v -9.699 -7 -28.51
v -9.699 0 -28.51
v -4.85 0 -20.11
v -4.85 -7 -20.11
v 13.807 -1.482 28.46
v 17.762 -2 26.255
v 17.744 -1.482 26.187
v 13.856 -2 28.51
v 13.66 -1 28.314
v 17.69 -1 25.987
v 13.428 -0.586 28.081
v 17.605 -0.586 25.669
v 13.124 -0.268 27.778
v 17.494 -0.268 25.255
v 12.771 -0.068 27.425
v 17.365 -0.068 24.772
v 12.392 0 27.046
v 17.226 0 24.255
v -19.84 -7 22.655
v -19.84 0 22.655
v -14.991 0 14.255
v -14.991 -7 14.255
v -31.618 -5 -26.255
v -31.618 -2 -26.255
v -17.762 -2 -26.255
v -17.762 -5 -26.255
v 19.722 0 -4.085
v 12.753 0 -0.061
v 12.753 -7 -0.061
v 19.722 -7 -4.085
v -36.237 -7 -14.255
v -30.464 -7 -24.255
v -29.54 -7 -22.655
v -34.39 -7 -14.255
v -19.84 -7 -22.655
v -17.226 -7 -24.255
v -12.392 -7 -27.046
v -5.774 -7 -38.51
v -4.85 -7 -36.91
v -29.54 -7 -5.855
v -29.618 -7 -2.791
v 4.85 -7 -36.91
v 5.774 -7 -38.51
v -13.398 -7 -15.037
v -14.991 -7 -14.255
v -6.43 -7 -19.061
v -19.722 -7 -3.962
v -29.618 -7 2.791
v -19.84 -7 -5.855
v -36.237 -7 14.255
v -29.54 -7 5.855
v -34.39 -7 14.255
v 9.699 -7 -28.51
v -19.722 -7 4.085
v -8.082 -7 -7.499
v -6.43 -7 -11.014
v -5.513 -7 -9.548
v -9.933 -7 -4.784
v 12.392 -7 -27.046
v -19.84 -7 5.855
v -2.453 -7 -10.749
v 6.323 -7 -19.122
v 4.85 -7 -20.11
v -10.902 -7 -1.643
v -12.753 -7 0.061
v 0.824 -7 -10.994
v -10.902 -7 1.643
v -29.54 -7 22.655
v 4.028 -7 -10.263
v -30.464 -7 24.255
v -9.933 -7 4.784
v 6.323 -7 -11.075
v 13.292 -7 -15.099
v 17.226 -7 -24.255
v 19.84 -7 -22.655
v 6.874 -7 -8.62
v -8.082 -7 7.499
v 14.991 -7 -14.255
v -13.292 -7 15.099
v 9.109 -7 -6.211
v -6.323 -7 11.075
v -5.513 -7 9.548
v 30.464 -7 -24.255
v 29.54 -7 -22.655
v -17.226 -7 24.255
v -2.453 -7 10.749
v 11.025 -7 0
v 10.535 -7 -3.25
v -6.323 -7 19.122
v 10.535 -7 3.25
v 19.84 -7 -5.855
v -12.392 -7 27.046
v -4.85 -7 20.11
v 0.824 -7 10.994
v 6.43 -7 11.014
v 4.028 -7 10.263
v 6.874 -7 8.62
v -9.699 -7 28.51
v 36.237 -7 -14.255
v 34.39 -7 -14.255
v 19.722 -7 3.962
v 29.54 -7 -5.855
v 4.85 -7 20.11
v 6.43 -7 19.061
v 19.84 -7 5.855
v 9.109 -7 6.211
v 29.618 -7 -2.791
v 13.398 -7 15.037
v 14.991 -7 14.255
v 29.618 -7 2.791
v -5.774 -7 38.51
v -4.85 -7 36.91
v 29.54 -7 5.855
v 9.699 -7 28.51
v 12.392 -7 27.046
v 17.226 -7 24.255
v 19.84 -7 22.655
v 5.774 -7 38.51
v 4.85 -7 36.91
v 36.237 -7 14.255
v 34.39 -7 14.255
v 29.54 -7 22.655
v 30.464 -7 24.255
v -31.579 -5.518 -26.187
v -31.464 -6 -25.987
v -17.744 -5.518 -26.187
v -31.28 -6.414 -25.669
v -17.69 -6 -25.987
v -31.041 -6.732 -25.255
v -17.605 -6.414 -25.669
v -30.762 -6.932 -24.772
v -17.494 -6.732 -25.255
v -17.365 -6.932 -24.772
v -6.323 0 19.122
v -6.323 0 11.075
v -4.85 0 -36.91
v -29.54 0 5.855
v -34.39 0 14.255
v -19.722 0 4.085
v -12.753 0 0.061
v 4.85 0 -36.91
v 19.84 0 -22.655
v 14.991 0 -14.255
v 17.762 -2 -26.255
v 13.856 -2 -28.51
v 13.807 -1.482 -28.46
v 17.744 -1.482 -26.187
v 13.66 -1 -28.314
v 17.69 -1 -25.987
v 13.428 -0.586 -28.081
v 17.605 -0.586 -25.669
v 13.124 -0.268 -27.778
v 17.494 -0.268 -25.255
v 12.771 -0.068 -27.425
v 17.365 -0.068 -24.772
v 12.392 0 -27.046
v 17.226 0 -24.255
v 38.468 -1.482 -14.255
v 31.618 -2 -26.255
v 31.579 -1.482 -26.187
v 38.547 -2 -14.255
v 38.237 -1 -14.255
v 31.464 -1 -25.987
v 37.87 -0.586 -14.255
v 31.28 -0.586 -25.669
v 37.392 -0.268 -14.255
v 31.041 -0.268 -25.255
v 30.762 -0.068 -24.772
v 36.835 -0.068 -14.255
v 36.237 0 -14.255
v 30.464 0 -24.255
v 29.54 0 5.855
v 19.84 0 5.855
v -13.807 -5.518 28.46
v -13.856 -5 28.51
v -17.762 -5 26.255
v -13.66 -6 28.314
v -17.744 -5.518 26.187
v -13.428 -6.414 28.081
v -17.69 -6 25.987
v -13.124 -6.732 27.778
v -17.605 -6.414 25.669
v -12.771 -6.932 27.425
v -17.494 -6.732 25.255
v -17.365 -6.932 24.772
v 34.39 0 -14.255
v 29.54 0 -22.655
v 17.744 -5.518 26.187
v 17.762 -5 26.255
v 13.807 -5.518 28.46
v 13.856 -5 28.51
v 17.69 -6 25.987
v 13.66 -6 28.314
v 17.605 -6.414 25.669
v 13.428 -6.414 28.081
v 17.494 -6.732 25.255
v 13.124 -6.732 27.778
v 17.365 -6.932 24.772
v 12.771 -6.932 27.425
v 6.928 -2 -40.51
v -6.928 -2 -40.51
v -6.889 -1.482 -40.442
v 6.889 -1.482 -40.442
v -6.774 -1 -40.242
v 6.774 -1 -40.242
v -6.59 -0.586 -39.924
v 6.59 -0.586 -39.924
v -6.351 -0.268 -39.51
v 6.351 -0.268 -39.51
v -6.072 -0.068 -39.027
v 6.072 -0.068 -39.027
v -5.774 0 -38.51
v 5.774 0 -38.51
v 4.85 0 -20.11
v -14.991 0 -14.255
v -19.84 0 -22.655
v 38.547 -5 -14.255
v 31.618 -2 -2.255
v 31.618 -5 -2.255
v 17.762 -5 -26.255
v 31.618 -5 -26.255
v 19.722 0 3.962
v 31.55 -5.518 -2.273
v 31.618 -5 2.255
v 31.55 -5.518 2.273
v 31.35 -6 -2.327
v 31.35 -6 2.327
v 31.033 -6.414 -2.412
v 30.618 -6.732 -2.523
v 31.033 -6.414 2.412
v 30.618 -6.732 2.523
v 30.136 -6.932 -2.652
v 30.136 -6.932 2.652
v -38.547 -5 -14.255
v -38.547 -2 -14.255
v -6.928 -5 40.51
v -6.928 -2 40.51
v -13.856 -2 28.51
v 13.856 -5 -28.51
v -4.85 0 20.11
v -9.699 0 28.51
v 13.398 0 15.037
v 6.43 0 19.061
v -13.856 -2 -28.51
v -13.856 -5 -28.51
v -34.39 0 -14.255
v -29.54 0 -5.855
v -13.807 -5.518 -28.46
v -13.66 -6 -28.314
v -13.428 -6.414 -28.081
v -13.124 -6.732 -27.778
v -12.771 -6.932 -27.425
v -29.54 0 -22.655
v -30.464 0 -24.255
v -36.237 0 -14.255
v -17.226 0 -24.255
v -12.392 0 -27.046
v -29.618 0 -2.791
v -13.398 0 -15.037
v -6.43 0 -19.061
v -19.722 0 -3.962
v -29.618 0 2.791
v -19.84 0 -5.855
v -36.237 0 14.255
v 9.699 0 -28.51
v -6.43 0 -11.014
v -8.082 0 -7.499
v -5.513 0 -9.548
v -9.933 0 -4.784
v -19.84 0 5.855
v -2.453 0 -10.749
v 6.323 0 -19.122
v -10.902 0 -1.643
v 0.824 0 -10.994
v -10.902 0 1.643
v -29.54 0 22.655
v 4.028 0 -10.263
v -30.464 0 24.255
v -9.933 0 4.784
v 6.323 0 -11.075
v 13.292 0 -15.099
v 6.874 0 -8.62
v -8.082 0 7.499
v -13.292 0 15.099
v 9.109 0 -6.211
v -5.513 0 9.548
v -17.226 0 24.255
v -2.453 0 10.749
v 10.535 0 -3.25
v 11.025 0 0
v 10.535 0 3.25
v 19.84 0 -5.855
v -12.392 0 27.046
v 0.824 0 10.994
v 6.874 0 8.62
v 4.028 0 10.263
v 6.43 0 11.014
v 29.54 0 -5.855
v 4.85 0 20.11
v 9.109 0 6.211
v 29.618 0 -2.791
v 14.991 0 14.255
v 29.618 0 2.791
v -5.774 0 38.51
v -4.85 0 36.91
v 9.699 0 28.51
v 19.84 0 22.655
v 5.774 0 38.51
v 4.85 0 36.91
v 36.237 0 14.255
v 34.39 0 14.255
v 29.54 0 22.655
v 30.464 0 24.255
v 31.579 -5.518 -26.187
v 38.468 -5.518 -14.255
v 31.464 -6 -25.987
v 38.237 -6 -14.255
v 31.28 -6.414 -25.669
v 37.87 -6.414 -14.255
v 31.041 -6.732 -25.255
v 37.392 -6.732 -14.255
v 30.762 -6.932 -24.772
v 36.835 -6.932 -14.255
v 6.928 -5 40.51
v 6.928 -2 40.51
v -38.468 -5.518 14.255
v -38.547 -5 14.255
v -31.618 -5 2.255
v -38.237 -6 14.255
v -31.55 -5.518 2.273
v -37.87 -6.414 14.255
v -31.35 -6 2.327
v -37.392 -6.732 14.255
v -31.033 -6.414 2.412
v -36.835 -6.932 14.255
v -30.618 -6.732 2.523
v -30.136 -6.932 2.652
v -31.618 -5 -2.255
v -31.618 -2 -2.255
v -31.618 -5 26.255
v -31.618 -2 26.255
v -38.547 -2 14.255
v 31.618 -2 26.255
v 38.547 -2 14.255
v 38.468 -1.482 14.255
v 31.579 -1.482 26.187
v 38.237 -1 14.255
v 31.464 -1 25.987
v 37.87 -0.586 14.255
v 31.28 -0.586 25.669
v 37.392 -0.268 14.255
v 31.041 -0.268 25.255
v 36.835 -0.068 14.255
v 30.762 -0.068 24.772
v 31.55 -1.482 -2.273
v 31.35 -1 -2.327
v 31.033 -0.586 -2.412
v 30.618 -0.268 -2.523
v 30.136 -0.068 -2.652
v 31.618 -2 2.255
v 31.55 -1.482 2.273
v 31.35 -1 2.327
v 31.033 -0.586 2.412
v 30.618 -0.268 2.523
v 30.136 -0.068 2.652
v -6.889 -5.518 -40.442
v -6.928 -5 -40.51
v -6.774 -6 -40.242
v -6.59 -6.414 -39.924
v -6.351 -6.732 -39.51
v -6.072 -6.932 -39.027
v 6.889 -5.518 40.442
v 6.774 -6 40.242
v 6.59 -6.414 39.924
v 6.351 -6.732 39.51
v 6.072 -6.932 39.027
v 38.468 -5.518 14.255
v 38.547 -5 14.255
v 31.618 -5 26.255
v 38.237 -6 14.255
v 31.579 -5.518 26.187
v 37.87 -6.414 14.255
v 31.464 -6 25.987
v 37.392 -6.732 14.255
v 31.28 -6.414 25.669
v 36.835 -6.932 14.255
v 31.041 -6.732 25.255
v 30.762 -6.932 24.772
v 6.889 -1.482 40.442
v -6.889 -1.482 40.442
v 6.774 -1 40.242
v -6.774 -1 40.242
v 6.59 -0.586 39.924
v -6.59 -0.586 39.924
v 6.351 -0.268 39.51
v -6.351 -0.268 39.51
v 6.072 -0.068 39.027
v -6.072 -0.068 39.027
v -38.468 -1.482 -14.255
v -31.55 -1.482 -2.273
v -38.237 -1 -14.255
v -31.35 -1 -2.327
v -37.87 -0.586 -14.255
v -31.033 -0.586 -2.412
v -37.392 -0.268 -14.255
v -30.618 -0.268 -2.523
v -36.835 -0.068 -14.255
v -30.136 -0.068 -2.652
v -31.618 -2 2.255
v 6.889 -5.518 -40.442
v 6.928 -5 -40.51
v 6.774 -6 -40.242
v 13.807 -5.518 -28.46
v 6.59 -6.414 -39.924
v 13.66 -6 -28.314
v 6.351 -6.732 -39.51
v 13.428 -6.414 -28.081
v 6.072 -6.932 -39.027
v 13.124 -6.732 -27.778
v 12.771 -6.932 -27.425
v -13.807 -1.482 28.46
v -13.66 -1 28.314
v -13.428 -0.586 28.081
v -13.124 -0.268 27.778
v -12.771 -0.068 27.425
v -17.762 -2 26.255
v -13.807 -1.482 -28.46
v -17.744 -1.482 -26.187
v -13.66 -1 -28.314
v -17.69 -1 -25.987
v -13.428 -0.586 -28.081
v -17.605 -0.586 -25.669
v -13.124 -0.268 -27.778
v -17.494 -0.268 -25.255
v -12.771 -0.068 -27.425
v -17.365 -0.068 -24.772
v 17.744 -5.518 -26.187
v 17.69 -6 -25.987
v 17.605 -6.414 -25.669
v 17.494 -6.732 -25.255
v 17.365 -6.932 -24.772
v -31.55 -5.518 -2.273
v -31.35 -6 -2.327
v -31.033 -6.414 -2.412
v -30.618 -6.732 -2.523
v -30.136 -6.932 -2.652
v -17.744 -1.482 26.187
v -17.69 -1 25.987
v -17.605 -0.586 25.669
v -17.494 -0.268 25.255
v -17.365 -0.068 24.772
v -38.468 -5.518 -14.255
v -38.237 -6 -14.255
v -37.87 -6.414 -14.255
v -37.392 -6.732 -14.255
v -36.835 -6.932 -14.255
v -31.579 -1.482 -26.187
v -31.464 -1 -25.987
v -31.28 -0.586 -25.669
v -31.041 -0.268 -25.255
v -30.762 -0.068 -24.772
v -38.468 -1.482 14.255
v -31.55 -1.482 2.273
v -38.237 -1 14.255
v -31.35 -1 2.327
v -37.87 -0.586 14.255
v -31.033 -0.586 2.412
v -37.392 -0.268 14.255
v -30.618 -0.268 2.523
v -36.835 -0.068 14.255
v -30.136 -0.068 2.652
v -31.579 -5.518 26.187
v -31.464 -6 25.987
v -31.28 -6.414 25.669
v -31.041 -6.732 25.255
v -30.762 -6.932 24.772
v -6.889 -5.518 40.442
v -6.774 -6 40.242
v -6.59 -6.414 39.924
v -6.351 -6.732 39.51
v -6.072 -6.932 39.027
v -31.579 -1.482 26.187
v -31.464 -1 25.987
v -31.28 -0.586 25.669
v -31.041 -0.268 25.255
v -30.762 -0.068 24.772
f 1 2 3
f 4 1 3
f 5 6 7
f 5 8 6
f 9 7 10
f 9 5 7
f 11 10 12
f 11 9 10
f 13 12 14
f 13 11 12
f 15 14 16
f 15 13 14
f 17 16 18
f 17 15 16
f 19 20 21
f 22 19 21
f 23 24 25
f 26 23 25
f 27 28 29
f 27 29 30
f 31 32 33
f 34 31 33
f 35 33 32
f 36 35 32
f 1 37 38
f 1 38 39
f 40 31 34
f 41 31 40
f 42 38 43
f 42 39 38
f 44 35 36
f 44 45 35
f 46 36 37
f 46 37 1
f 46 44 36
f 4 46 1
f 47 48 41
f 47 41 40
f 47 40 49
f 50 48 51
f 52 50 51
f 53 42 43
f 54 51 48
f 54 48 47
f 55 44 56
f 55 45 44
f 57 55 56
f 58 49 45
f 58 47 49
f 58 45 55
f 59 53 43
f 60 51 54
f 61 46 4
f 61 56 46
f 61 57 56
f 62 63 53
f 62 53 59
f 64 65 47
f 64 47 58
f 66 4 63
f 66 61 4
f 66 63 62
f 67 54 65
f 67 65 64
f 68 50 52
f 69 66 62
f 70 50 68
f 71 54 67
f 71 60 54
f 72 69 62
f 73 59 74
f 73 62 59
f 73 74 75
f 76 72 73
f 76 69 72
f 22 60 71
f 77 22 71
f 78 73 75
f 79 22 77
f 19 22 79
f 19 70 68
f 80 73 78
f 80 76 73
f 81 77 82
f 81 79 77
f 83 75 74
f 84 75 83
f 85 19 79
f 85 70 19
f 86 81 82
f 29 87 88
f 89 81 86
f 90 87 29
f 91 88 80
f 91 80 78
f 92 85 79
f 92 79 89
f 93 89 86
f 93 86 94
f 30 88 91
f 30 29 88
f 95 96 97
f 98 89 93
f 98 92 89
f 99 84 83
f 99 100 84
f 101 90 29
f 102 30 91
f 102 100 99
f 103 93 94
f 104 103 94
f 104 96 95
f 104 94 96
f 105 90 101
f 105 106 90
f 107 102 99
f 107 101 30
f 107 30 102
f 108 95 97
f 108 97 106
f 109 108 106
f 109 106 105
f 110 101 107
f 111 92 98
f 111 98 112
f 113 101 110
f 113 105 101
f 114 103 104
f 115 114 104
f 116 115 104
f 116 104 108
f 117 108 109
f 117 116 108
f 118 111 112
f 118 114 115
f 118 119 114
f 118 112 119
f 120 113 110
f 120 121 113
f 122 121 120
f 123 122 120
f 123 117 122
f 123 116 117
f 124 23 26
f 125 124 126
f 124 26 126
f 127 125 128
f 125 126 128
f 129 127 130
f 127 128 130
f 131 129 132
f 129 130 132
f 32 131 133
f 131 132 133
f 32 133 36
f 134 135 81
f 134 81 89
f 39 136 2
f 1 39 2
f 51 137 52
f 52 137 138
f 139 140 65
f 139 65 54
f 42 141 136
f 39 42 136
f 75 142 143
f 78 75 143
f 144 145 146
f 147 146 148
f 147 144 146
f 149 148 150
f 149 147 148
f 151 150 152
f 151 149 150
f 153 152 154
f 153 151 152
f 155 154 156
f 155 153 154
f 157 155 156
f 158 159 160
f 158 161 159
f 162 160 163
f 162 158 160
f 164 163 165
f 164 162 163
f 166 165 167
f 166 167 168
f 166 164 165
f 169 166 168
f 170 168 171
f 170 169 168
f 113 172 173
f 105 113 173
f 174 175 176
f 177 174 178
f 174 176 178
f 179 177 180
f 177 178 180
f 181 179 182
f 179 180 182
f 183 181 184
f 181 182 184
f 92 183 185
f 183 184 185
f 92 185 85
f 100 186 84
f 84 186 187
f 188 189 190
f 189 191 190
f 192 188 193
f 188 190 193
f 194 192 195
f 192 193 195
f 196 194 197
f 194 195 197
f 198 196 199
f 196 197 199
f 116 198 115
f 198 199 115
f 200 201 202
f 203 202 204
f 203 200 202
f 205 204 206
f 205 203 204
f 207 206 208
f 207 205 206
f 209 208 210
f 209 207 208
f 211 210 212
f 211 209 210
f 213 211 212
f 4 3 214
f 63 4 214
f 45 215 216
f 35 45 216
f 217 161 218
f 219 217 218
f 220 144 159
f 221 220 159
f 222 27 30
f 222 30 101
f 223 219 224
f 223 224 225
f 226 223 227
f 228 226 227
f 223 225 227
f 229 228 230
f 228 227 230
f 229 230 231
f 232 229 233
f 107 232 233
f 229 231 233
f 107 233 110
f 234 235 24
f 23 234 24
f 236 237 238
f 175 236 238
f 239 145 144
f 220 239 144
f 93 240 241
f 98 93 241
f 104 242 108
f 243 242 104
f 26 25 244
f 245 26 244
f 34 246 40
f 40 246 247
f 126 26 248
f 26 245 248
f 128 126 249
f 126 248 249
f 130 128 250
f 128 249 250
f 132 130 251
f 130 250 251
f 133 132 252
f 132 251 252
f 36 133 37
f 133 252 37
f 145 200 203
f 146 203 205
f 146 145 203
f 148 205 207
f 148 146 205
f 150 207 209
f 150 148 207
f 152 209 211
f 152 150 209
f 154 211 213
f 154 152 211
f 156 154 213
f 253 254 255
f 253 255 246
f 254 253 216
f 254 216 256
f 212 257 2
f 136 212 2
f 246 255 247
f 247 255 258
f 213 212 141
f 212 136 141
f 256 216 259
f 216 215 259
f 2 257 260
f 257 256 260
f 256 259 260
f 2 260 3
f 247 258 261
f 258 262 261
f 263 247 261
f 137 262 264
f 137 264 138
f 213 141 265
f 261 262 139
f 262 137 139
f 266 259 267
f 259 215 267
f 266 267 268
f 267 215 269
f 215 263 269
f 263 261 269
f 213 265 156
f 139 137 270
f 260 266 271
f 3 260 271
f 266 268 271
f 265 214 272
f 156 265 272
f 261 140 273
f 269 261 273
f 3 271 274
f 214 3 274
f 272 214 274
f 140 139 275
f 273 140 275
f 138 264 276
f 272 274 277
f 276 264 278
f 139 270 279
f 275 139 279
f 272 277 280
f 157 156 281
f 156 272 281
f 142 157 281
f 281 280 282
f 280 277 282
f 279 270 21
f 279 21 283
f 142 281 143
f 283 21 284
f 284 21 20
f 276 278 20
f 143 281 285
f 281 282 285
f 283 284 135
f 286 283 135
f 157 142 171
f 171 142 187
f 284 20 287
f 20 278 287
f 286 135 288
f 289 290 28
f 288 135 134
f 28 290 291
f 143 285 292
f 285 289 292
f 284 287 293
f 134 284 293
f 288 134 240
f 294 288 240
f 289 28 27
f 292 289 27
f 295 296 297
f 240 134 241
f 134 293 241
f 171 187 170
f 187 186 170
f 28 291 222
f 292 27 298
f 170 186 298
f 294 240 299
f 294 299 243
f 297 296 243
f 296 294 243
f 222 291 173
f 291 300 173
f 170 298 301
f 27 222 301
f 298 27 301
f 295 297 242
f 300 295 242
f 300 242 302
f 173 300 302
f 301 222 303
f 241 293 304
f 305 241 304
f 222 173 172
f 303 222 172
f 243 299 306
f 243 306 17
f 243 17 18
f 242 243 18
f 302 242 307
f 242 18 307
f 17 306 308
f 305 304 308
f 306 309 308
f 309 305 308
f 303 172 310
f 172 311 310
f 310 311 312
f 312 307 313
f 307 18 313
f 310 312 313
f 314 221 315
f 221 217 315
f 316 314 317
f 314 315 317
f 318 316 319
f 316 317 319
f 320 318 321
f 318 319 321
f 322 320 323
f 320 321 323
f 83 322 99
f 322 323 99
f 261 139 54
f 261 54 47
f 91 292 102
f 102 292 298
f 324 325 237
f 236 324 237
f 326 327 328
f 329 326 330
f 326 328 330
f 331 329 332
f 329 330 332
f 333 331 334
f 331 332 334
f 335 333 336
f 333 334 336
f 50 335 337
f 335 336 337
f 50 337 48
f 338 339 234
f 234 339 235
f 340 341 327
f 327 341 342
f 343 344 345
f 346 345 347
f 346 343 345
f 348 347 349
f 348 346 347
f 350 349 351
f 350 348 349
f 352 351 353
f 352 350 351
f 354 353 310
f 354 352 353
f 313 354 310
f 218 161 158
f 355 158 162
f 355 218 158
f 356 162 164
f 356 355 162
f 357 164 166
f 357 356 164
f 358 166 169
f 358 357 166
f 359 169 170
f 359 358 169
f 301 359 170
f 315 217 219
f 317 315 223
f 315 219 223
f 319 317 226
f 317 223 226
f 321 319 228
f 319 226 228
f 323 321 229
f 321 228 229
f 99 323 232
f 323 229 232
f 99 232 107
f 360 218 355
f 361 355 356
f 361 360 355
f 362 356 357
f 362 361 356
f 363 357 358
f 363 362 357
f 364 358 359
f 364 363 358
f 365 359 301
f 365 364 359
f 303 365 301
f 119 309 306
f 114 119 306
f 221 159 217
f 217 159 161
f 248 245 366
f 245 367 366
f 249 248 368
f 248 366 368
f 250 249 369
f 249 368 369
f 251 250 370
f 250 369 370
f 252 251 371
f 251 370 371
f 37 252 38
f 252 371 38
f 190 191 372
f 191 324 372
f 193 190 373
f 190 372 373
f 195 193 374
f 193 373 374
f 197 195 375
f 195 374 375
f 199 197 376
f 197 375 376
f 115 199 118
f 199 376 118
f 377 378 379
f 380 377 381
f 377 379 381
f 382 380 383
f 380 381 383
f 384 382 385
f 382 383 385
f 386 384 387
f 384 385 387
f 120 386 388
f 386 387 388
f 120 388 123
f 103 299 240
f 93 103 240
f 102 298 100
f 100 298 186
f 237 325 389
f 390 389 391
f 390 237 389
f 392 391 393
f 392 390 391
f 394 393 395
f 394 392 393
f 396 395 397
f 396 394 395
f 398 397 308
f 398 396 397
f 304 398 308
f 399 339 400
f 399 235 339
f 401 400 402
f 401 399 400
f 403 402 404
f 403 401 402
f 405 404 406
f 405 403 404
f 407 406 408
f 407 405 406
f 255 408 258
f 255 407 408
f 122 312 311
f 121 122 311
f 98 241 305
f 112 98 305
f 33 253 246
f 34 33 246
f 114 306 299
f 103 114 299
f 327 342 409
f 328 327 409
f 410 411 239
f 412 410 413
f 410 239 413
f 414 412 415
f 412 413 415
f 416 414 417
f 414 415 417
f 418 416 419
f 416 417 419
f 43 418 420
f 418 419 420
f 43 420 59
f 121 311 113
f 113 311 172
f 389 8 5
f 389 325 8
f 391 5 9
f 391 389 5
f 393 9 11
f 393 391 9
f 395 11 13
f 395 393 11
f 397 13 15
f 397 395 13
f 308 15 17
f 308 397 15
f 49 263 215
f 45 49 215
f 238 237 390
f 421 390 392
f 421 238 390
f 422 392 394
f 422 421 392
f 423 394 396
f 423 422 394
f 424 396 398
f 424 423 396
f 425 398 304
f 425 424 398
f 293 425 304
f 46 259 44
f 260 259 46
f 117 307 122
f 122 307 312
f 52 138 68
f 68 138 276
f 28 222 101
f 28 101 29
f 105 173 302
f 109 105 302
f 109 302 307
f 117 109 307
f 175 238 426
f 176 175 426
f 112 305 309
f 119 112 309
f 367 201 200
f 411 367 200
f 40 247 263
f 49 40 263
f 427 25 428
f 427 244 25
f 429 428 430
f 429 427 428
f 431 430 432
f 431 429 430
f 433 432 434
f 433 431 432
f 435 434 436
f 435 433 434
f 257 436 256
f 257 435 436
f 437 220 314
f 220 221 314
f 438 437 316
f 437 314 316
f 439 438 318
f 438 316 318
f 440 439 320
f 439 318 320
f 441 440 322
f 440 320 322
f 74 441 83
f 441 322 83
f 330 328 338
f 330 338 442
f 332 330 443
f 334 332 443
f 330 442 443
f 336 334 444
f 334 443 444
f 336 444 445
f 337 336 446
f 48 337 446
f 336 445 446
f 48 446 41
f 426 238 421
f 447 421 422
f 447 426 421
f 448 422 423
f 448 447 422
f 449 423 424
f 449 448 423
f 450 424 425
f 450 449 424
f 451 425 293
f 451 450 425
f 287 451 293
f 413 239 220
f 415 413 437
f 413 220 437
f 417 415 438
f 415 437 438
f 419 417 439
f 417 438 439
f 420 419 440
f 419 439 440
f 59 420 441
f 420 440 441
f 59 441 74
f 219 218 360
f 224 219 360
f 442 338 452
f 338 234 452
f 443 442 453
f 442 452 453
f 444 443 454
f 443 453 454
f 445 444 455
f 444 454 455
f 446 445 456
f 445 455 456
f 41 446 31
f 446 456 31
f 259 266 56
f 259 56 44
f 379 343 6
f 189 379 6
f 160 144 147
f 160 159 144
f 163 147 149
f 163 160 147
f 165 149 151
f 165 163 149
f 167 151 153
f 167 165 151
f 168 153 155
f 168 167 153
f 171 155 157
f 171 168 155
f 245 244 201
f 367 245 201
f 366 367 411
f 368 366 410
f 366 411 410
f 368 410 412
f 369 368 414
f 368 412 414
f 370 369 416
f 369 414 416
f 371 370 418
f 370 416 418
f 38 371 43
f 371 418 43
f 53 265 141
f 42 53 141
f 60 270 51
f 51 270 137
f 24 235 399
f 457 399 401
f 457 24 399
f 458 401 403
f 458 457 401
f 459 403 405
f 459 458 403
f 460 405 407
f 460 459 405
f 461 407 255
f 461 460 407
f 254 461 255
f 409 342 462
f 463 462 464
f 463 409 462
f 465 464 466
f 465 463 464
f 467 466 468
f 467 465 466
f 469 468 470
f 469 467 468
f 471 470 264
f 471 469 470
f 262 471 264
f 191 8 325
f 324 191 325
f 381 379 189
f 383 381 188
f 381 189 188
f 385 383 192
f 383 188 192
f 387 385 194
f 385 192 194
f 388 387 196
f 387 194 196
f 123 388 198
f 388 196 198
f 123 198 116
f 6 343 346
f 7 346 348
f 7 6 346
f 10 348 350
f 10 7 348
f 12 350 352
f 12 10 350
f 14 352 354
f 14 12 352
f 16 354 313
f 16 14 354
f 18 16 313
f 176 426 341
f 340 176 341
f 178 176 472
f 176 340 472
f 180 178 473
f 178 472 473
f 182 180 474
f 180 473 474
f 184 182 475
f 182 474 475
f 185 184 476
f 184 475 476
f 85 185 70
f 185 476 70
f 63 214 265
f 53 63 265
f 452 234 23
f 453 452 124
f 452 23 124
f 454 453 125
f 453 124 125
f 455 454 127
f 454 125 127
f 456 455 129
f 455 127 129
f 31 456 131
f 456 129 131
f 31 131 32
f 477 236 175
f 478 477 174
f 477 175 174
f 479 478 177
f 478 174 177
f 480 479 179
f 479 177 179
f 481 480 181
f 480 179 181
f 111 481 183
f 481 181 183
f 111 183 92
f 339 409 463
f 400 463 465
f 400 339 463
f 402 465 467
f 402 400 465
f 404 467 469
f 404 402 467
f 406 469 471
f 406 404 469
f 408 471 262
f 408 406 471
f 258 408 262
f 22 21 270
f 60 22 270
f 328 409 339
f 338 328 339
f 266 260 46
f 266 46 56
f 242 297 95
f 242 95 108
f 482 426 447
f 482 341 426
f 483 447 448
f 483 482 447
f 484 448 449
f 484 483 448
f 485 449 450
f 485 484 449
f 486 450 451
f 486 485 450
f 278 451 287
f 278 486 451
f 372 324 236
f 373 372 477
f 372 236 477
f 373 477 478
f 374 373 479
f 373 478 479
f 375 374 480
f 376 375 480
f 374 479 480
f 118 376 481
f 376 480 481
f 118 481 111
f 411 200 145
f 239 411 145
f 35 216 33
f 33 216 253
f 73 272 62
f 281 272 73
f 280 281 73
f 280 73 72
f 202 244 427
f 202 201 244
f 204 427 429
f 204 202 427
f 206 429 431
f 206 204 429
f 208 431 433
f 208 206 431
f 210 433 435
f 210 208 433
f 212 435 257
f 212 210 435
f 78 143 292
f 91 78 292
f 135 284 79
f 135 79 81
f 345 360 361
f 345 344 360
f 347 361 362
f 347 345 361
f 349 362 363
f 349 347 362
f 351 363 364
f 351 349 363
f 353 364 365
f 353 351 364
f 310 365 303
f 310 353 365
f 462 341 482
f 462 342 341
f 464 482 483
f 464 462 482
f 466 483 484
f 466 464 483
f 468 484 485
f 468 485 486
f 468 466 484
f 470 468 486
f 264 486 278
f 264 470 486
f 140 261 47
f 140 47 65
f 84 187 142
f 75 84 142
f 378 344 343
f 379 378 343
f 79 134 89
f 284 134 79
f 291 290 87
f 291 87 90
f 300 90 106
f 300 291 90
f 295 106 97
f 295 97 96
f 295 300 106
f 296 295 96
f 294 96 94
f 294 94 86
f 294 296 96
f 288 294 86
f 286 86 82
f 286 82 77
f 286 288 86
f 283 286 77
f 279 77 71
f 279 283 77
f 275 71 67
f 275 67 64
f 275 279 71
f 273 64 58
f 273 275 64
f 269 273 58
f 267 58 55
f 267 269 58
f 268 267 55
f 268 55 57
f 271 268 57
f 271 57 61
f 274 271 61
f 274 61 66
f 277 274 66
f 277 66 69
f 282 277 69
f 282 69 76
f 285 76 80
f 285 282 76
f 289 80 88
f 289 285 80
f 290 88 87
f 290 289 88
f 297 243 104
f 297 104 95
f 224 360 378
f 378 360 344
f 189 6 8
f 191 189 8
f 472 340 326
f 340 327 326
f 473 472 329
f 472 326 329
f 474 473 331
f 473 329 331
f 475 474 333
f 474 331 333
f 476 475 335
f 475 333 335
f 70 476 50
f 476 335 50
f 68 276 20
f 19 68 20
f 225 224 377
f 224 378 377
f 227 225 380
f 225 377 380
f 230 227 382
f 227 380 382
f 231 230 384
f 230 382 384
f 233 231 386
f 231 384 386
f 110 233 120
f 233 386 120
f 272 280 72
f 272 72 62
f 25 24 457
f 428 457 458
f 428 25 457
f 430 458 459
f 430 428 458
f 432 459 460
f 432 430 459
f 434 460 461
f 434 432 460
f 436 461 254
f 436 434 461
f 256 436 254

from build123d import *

# Parameters (mm, degrees)
F0_R     = 14.5
F0_R_2   = 11.025
F1_DEPTH = 7
F2_R     = 2
F4_DEPTH = 7


# Not quite as in the source:
# - a feature names something its author has since deleted; it is built from what else it names


with BuildPart() as f1:
    # F0 (on Front) → F1 (new body)
    with BuildSketch(Plane.XZ):
        Polygon((13.8564064606, 28.5096937621), (6.9282032303, 16.5096937621), (-6.9282032303, 16.5096937621), (-13.8564064606, 28.5096937621), (-17.7619158218, 26.254846881), (-10.8337125915, 14.254846881), (-17.7619158218, 2.254846881), (-31.6183222823, 2.254846881), (-31.6183222823, -2.254846881), (-17.7619158218, -2.254846881), (-10.8337125915, -14.254846881), (-17.7619158218, -26.254846881), (-13.8564064606, -28.5096937621), (-6.9282032303, -16.5096937621), (6.9282032303, -16.5096937621), (13.8564064606, -28.5096937621), (17.7619158218, -26.254846881), (10.8337125915, -14.254846881), (17.7619158218, -2.254846881), (31.6183222823, -2.254846881), (31.6183222823, 2.254846881), (17.7619158218, 2.254846881), (10.8337125915, 14.254846881), (17.7619158218, 26.254846881), align=None)
        Circle(F0_R, mode=Mode.SUBTRACT)
        Polygon((-6.9282032303, 16.5096937621), (6.9282032303, 16.5096937621), (13.8564064606, 28.5096937621), (6.9282032303, 40.5096937621), (-6.9282032303, 40.5096937621), (-13.8564064606, 28.5096937621), align=None)
        Polygon((9.6994845224, 28.5096937621), (4.8497422612, 20.1096937621), (-4.8497422612, 20.1096937621), (-9.6994845224, 28.5096937621), (-4.8497422612, 36.9096937621), (4.8497422612, 36.9096937621), align=None, mode=Mode.SUBTRACT)
        Polygon((31.6183222823, 26.254846881), (17.7619158218, 26.254846881), (10.8337125915, 14.254846881), (17.7619158218, 2.254846881), (31.6183222823, 2.254846881), (38.5465255126, 14.254846881), align=None)
        Polygon((29.5398613133, 22.654846881), (34.3896035744, 14.254846881), (29.5398613133, 5.854846881), (19.8403767909, 5.854846881), (14.9906345297, 14.254846881), (19.8403767909, 22.654846881), align=None, mode=Mode.SUBTRACT)
        Polygon((-10.8337125915, 14.254846881), (-17.7619158218, 26.254846881), (-31.6183222823, 26.254846881), (-38.5465255126, 14.254846881), (-31.6183222823, 2.254846881), (-17.7619158218, 2.254846881), align=None)
        Polygon((-34.3896035744, 14.254846881), (-29.5398613133, 22.654846881), (-19.8403767909, 22.654846881), (-14.9906345297, 14.254846881), (-19.8403767909, 5.854846881), (-29.5398613133, 5.854846881), align=None, mode=Mode.SUBTRACT)
        Polygon((38.5465255126, -14.254846881), (31.6183222823, -2.254846881), (17.7619158218, -2.254846881), (10.8337125915, -14.254846881), (17.7619158218, -26.254846881), (31.6183222823, -26.254846881), align=None)
        Polygon((34.3896035744, -14.254846881), (29.5398613133, -22.654846881), (19.8403767909, -22.654846881), (14.9906345297, -14.254846881), (19.8403767909, -5.854846881), (29.5398613133, -5.854846881), align=None, mode=Mode.SUBTRACT)
        Polygon((-17.7619158218, -2.254846881), (-31.6183222823, -2.254846881), (-38.5465255126, -14.254846881), (-31.6183222823, -26.254846881), (-17.7619158218, -26.254846881), (-10.8337125915, -14.254846881), align=None)
        Polygon((-29.5398613133, -22.654846881), (-34.3896035744, -14.254846881), (-29.5398613133, -5.854846881), (-19.8403767909, -5.854846881), (-14.9906345297, -14.254846881), (-19.8403767909, -22.654846881), align=None, mode=Mode.SUBTRACT)
        Polygon((6.9282032303, -40.5096937621), (13.8564064606, -28.5096937621), (6.9282032303, -16.5096937621), (-6.9282032303, -16.5096937621), (-13.8564064606, -28.5096937621), (-6.9282032303, -40.5096937621), align=None)
        Polygon((4.8497422612, -36.9096937621), (-4.8497422612, -36.9096937621), (-9.6994845224, -28.5096937621), (-4.8497422612, -20.1096937621), (4.8497422612, -20.1096937621), (9.6994845224, -28.5096937621), align=None, mode=Mode.SUBTRACT)
        Circle(F0_R)
        Circle(F0_R_2, mode=Mode.SUBTRACT)
    extrude(amount=F1_DEPTH)

    # F2
    f2_edges = [f1.edges().sort_by_distance(p)[0] for p in [
        (0, -7, 40.509694),
        (10.392305, -7, 34.509694),
        (24.690119, -7, 26.254847),
        (35.082424, -7, 20.254847),
        (35.082424, -7, 8.254847),
        (35.082424, -7, -8.254847),
        (35.082424, -7, -20.254847),
        (24.690119, -7, -26.254847),
        (10.392305, -7, -34.509694),
        (0, -7, -40.509694),
        (-10.392305, -7, -34.509694),
        (-24.690119, -7, -26.254847),
        (-35.082424, -7, -20.254847),
        (-35.082424, -7, -8.254847),
        (-35.082424, -7, 8.254847),
        (-35.082424, -7, 20.254847),
        (-24.690119, -7, 26.254847),
        (-10.392305, -7, 34.509694),
        (-10.392305, 0, -34.509694),
        (10.392305, 0, -34.509694),
        (24.690119, 0, -26.254847),
        (35.082424, 0, -20.254847),
        (35.082424, 0, -8.254847),
        (35.082424, 0, 8.254847),
        (35.082424, 0, 20.254847),
        (24.690119, 0, 26.254847),
        (10.392305, 0, 34.509694),
        (-24.690119, 0, 26.254847),
        (-35.082424, 0, 20.254847),
        (-35.082424, 0, 8.254847),
        (-35.082424, 0, -8.254847),
        (-35.082424, 0, -20.254847),
        (-24.690119, 0, -26.254847),
        (0, 0, -40.509694),
        (-10.392305, 0, 34.509694),
        (0, 0, 40.509694),
        (-15.809161, -7, 27.38227),
        (15.809161, -7, 27.38227),
        (31.618322, -7, 0),
        (15.809161, -7, -27.38227),
        (-15.809161, -7, -27.38227),
        (-31.618322, -7, 0),
        (-15.809161, 0, 27.38227),
        (15.809161, 0, 27.38227),
        (31.618322, 0, 0),
        (15.809161, 0, -27.38227),
        (-15.809161, 0, -27.38227),
        (-31.618322, 0, 0),
    ]]
    fillet(f2_edges, radius=F2_R)

    # F3 (on Front) → F4 (cut)
    with BuildSketch(Plane.XZ):
        Polygon((-6.3233720139, 11.0753334069), (-6.3233720139, 19.1219889618), (-13.2919801399, 15.0986611843), align=None)
        Polygon((-19.7218142187, 4.0847936793), (-19.7218142187, -3.9618618756), (-12.7532060927, 0.0614659018), align=None)
        Polygon((-13.3984422048, -15.0371952825), (-6.4298340788, -19.0605230599), (-6.4298340788, -11.013867505), align=None)
        Polygon((6.3233720139, -19.1219889618), (13.2919801399, -15.0986611843), (6.3233720139, -11.0753334069), align=None)
        Polygon((19.7218142187, -4.0847936793), (19.7218142187, 3.9618618756), (12.7532060927, -0.0614659018), align=None)
        Polygon((13.3984422048, 15.0371952825), (6.4298340788, 19.0605230599), (6.4298340788, 11.013867505), align=None)
    extrude(amount=F4_DEPTH, mode=Mode.SUBTRACT)


solid = f1.part
